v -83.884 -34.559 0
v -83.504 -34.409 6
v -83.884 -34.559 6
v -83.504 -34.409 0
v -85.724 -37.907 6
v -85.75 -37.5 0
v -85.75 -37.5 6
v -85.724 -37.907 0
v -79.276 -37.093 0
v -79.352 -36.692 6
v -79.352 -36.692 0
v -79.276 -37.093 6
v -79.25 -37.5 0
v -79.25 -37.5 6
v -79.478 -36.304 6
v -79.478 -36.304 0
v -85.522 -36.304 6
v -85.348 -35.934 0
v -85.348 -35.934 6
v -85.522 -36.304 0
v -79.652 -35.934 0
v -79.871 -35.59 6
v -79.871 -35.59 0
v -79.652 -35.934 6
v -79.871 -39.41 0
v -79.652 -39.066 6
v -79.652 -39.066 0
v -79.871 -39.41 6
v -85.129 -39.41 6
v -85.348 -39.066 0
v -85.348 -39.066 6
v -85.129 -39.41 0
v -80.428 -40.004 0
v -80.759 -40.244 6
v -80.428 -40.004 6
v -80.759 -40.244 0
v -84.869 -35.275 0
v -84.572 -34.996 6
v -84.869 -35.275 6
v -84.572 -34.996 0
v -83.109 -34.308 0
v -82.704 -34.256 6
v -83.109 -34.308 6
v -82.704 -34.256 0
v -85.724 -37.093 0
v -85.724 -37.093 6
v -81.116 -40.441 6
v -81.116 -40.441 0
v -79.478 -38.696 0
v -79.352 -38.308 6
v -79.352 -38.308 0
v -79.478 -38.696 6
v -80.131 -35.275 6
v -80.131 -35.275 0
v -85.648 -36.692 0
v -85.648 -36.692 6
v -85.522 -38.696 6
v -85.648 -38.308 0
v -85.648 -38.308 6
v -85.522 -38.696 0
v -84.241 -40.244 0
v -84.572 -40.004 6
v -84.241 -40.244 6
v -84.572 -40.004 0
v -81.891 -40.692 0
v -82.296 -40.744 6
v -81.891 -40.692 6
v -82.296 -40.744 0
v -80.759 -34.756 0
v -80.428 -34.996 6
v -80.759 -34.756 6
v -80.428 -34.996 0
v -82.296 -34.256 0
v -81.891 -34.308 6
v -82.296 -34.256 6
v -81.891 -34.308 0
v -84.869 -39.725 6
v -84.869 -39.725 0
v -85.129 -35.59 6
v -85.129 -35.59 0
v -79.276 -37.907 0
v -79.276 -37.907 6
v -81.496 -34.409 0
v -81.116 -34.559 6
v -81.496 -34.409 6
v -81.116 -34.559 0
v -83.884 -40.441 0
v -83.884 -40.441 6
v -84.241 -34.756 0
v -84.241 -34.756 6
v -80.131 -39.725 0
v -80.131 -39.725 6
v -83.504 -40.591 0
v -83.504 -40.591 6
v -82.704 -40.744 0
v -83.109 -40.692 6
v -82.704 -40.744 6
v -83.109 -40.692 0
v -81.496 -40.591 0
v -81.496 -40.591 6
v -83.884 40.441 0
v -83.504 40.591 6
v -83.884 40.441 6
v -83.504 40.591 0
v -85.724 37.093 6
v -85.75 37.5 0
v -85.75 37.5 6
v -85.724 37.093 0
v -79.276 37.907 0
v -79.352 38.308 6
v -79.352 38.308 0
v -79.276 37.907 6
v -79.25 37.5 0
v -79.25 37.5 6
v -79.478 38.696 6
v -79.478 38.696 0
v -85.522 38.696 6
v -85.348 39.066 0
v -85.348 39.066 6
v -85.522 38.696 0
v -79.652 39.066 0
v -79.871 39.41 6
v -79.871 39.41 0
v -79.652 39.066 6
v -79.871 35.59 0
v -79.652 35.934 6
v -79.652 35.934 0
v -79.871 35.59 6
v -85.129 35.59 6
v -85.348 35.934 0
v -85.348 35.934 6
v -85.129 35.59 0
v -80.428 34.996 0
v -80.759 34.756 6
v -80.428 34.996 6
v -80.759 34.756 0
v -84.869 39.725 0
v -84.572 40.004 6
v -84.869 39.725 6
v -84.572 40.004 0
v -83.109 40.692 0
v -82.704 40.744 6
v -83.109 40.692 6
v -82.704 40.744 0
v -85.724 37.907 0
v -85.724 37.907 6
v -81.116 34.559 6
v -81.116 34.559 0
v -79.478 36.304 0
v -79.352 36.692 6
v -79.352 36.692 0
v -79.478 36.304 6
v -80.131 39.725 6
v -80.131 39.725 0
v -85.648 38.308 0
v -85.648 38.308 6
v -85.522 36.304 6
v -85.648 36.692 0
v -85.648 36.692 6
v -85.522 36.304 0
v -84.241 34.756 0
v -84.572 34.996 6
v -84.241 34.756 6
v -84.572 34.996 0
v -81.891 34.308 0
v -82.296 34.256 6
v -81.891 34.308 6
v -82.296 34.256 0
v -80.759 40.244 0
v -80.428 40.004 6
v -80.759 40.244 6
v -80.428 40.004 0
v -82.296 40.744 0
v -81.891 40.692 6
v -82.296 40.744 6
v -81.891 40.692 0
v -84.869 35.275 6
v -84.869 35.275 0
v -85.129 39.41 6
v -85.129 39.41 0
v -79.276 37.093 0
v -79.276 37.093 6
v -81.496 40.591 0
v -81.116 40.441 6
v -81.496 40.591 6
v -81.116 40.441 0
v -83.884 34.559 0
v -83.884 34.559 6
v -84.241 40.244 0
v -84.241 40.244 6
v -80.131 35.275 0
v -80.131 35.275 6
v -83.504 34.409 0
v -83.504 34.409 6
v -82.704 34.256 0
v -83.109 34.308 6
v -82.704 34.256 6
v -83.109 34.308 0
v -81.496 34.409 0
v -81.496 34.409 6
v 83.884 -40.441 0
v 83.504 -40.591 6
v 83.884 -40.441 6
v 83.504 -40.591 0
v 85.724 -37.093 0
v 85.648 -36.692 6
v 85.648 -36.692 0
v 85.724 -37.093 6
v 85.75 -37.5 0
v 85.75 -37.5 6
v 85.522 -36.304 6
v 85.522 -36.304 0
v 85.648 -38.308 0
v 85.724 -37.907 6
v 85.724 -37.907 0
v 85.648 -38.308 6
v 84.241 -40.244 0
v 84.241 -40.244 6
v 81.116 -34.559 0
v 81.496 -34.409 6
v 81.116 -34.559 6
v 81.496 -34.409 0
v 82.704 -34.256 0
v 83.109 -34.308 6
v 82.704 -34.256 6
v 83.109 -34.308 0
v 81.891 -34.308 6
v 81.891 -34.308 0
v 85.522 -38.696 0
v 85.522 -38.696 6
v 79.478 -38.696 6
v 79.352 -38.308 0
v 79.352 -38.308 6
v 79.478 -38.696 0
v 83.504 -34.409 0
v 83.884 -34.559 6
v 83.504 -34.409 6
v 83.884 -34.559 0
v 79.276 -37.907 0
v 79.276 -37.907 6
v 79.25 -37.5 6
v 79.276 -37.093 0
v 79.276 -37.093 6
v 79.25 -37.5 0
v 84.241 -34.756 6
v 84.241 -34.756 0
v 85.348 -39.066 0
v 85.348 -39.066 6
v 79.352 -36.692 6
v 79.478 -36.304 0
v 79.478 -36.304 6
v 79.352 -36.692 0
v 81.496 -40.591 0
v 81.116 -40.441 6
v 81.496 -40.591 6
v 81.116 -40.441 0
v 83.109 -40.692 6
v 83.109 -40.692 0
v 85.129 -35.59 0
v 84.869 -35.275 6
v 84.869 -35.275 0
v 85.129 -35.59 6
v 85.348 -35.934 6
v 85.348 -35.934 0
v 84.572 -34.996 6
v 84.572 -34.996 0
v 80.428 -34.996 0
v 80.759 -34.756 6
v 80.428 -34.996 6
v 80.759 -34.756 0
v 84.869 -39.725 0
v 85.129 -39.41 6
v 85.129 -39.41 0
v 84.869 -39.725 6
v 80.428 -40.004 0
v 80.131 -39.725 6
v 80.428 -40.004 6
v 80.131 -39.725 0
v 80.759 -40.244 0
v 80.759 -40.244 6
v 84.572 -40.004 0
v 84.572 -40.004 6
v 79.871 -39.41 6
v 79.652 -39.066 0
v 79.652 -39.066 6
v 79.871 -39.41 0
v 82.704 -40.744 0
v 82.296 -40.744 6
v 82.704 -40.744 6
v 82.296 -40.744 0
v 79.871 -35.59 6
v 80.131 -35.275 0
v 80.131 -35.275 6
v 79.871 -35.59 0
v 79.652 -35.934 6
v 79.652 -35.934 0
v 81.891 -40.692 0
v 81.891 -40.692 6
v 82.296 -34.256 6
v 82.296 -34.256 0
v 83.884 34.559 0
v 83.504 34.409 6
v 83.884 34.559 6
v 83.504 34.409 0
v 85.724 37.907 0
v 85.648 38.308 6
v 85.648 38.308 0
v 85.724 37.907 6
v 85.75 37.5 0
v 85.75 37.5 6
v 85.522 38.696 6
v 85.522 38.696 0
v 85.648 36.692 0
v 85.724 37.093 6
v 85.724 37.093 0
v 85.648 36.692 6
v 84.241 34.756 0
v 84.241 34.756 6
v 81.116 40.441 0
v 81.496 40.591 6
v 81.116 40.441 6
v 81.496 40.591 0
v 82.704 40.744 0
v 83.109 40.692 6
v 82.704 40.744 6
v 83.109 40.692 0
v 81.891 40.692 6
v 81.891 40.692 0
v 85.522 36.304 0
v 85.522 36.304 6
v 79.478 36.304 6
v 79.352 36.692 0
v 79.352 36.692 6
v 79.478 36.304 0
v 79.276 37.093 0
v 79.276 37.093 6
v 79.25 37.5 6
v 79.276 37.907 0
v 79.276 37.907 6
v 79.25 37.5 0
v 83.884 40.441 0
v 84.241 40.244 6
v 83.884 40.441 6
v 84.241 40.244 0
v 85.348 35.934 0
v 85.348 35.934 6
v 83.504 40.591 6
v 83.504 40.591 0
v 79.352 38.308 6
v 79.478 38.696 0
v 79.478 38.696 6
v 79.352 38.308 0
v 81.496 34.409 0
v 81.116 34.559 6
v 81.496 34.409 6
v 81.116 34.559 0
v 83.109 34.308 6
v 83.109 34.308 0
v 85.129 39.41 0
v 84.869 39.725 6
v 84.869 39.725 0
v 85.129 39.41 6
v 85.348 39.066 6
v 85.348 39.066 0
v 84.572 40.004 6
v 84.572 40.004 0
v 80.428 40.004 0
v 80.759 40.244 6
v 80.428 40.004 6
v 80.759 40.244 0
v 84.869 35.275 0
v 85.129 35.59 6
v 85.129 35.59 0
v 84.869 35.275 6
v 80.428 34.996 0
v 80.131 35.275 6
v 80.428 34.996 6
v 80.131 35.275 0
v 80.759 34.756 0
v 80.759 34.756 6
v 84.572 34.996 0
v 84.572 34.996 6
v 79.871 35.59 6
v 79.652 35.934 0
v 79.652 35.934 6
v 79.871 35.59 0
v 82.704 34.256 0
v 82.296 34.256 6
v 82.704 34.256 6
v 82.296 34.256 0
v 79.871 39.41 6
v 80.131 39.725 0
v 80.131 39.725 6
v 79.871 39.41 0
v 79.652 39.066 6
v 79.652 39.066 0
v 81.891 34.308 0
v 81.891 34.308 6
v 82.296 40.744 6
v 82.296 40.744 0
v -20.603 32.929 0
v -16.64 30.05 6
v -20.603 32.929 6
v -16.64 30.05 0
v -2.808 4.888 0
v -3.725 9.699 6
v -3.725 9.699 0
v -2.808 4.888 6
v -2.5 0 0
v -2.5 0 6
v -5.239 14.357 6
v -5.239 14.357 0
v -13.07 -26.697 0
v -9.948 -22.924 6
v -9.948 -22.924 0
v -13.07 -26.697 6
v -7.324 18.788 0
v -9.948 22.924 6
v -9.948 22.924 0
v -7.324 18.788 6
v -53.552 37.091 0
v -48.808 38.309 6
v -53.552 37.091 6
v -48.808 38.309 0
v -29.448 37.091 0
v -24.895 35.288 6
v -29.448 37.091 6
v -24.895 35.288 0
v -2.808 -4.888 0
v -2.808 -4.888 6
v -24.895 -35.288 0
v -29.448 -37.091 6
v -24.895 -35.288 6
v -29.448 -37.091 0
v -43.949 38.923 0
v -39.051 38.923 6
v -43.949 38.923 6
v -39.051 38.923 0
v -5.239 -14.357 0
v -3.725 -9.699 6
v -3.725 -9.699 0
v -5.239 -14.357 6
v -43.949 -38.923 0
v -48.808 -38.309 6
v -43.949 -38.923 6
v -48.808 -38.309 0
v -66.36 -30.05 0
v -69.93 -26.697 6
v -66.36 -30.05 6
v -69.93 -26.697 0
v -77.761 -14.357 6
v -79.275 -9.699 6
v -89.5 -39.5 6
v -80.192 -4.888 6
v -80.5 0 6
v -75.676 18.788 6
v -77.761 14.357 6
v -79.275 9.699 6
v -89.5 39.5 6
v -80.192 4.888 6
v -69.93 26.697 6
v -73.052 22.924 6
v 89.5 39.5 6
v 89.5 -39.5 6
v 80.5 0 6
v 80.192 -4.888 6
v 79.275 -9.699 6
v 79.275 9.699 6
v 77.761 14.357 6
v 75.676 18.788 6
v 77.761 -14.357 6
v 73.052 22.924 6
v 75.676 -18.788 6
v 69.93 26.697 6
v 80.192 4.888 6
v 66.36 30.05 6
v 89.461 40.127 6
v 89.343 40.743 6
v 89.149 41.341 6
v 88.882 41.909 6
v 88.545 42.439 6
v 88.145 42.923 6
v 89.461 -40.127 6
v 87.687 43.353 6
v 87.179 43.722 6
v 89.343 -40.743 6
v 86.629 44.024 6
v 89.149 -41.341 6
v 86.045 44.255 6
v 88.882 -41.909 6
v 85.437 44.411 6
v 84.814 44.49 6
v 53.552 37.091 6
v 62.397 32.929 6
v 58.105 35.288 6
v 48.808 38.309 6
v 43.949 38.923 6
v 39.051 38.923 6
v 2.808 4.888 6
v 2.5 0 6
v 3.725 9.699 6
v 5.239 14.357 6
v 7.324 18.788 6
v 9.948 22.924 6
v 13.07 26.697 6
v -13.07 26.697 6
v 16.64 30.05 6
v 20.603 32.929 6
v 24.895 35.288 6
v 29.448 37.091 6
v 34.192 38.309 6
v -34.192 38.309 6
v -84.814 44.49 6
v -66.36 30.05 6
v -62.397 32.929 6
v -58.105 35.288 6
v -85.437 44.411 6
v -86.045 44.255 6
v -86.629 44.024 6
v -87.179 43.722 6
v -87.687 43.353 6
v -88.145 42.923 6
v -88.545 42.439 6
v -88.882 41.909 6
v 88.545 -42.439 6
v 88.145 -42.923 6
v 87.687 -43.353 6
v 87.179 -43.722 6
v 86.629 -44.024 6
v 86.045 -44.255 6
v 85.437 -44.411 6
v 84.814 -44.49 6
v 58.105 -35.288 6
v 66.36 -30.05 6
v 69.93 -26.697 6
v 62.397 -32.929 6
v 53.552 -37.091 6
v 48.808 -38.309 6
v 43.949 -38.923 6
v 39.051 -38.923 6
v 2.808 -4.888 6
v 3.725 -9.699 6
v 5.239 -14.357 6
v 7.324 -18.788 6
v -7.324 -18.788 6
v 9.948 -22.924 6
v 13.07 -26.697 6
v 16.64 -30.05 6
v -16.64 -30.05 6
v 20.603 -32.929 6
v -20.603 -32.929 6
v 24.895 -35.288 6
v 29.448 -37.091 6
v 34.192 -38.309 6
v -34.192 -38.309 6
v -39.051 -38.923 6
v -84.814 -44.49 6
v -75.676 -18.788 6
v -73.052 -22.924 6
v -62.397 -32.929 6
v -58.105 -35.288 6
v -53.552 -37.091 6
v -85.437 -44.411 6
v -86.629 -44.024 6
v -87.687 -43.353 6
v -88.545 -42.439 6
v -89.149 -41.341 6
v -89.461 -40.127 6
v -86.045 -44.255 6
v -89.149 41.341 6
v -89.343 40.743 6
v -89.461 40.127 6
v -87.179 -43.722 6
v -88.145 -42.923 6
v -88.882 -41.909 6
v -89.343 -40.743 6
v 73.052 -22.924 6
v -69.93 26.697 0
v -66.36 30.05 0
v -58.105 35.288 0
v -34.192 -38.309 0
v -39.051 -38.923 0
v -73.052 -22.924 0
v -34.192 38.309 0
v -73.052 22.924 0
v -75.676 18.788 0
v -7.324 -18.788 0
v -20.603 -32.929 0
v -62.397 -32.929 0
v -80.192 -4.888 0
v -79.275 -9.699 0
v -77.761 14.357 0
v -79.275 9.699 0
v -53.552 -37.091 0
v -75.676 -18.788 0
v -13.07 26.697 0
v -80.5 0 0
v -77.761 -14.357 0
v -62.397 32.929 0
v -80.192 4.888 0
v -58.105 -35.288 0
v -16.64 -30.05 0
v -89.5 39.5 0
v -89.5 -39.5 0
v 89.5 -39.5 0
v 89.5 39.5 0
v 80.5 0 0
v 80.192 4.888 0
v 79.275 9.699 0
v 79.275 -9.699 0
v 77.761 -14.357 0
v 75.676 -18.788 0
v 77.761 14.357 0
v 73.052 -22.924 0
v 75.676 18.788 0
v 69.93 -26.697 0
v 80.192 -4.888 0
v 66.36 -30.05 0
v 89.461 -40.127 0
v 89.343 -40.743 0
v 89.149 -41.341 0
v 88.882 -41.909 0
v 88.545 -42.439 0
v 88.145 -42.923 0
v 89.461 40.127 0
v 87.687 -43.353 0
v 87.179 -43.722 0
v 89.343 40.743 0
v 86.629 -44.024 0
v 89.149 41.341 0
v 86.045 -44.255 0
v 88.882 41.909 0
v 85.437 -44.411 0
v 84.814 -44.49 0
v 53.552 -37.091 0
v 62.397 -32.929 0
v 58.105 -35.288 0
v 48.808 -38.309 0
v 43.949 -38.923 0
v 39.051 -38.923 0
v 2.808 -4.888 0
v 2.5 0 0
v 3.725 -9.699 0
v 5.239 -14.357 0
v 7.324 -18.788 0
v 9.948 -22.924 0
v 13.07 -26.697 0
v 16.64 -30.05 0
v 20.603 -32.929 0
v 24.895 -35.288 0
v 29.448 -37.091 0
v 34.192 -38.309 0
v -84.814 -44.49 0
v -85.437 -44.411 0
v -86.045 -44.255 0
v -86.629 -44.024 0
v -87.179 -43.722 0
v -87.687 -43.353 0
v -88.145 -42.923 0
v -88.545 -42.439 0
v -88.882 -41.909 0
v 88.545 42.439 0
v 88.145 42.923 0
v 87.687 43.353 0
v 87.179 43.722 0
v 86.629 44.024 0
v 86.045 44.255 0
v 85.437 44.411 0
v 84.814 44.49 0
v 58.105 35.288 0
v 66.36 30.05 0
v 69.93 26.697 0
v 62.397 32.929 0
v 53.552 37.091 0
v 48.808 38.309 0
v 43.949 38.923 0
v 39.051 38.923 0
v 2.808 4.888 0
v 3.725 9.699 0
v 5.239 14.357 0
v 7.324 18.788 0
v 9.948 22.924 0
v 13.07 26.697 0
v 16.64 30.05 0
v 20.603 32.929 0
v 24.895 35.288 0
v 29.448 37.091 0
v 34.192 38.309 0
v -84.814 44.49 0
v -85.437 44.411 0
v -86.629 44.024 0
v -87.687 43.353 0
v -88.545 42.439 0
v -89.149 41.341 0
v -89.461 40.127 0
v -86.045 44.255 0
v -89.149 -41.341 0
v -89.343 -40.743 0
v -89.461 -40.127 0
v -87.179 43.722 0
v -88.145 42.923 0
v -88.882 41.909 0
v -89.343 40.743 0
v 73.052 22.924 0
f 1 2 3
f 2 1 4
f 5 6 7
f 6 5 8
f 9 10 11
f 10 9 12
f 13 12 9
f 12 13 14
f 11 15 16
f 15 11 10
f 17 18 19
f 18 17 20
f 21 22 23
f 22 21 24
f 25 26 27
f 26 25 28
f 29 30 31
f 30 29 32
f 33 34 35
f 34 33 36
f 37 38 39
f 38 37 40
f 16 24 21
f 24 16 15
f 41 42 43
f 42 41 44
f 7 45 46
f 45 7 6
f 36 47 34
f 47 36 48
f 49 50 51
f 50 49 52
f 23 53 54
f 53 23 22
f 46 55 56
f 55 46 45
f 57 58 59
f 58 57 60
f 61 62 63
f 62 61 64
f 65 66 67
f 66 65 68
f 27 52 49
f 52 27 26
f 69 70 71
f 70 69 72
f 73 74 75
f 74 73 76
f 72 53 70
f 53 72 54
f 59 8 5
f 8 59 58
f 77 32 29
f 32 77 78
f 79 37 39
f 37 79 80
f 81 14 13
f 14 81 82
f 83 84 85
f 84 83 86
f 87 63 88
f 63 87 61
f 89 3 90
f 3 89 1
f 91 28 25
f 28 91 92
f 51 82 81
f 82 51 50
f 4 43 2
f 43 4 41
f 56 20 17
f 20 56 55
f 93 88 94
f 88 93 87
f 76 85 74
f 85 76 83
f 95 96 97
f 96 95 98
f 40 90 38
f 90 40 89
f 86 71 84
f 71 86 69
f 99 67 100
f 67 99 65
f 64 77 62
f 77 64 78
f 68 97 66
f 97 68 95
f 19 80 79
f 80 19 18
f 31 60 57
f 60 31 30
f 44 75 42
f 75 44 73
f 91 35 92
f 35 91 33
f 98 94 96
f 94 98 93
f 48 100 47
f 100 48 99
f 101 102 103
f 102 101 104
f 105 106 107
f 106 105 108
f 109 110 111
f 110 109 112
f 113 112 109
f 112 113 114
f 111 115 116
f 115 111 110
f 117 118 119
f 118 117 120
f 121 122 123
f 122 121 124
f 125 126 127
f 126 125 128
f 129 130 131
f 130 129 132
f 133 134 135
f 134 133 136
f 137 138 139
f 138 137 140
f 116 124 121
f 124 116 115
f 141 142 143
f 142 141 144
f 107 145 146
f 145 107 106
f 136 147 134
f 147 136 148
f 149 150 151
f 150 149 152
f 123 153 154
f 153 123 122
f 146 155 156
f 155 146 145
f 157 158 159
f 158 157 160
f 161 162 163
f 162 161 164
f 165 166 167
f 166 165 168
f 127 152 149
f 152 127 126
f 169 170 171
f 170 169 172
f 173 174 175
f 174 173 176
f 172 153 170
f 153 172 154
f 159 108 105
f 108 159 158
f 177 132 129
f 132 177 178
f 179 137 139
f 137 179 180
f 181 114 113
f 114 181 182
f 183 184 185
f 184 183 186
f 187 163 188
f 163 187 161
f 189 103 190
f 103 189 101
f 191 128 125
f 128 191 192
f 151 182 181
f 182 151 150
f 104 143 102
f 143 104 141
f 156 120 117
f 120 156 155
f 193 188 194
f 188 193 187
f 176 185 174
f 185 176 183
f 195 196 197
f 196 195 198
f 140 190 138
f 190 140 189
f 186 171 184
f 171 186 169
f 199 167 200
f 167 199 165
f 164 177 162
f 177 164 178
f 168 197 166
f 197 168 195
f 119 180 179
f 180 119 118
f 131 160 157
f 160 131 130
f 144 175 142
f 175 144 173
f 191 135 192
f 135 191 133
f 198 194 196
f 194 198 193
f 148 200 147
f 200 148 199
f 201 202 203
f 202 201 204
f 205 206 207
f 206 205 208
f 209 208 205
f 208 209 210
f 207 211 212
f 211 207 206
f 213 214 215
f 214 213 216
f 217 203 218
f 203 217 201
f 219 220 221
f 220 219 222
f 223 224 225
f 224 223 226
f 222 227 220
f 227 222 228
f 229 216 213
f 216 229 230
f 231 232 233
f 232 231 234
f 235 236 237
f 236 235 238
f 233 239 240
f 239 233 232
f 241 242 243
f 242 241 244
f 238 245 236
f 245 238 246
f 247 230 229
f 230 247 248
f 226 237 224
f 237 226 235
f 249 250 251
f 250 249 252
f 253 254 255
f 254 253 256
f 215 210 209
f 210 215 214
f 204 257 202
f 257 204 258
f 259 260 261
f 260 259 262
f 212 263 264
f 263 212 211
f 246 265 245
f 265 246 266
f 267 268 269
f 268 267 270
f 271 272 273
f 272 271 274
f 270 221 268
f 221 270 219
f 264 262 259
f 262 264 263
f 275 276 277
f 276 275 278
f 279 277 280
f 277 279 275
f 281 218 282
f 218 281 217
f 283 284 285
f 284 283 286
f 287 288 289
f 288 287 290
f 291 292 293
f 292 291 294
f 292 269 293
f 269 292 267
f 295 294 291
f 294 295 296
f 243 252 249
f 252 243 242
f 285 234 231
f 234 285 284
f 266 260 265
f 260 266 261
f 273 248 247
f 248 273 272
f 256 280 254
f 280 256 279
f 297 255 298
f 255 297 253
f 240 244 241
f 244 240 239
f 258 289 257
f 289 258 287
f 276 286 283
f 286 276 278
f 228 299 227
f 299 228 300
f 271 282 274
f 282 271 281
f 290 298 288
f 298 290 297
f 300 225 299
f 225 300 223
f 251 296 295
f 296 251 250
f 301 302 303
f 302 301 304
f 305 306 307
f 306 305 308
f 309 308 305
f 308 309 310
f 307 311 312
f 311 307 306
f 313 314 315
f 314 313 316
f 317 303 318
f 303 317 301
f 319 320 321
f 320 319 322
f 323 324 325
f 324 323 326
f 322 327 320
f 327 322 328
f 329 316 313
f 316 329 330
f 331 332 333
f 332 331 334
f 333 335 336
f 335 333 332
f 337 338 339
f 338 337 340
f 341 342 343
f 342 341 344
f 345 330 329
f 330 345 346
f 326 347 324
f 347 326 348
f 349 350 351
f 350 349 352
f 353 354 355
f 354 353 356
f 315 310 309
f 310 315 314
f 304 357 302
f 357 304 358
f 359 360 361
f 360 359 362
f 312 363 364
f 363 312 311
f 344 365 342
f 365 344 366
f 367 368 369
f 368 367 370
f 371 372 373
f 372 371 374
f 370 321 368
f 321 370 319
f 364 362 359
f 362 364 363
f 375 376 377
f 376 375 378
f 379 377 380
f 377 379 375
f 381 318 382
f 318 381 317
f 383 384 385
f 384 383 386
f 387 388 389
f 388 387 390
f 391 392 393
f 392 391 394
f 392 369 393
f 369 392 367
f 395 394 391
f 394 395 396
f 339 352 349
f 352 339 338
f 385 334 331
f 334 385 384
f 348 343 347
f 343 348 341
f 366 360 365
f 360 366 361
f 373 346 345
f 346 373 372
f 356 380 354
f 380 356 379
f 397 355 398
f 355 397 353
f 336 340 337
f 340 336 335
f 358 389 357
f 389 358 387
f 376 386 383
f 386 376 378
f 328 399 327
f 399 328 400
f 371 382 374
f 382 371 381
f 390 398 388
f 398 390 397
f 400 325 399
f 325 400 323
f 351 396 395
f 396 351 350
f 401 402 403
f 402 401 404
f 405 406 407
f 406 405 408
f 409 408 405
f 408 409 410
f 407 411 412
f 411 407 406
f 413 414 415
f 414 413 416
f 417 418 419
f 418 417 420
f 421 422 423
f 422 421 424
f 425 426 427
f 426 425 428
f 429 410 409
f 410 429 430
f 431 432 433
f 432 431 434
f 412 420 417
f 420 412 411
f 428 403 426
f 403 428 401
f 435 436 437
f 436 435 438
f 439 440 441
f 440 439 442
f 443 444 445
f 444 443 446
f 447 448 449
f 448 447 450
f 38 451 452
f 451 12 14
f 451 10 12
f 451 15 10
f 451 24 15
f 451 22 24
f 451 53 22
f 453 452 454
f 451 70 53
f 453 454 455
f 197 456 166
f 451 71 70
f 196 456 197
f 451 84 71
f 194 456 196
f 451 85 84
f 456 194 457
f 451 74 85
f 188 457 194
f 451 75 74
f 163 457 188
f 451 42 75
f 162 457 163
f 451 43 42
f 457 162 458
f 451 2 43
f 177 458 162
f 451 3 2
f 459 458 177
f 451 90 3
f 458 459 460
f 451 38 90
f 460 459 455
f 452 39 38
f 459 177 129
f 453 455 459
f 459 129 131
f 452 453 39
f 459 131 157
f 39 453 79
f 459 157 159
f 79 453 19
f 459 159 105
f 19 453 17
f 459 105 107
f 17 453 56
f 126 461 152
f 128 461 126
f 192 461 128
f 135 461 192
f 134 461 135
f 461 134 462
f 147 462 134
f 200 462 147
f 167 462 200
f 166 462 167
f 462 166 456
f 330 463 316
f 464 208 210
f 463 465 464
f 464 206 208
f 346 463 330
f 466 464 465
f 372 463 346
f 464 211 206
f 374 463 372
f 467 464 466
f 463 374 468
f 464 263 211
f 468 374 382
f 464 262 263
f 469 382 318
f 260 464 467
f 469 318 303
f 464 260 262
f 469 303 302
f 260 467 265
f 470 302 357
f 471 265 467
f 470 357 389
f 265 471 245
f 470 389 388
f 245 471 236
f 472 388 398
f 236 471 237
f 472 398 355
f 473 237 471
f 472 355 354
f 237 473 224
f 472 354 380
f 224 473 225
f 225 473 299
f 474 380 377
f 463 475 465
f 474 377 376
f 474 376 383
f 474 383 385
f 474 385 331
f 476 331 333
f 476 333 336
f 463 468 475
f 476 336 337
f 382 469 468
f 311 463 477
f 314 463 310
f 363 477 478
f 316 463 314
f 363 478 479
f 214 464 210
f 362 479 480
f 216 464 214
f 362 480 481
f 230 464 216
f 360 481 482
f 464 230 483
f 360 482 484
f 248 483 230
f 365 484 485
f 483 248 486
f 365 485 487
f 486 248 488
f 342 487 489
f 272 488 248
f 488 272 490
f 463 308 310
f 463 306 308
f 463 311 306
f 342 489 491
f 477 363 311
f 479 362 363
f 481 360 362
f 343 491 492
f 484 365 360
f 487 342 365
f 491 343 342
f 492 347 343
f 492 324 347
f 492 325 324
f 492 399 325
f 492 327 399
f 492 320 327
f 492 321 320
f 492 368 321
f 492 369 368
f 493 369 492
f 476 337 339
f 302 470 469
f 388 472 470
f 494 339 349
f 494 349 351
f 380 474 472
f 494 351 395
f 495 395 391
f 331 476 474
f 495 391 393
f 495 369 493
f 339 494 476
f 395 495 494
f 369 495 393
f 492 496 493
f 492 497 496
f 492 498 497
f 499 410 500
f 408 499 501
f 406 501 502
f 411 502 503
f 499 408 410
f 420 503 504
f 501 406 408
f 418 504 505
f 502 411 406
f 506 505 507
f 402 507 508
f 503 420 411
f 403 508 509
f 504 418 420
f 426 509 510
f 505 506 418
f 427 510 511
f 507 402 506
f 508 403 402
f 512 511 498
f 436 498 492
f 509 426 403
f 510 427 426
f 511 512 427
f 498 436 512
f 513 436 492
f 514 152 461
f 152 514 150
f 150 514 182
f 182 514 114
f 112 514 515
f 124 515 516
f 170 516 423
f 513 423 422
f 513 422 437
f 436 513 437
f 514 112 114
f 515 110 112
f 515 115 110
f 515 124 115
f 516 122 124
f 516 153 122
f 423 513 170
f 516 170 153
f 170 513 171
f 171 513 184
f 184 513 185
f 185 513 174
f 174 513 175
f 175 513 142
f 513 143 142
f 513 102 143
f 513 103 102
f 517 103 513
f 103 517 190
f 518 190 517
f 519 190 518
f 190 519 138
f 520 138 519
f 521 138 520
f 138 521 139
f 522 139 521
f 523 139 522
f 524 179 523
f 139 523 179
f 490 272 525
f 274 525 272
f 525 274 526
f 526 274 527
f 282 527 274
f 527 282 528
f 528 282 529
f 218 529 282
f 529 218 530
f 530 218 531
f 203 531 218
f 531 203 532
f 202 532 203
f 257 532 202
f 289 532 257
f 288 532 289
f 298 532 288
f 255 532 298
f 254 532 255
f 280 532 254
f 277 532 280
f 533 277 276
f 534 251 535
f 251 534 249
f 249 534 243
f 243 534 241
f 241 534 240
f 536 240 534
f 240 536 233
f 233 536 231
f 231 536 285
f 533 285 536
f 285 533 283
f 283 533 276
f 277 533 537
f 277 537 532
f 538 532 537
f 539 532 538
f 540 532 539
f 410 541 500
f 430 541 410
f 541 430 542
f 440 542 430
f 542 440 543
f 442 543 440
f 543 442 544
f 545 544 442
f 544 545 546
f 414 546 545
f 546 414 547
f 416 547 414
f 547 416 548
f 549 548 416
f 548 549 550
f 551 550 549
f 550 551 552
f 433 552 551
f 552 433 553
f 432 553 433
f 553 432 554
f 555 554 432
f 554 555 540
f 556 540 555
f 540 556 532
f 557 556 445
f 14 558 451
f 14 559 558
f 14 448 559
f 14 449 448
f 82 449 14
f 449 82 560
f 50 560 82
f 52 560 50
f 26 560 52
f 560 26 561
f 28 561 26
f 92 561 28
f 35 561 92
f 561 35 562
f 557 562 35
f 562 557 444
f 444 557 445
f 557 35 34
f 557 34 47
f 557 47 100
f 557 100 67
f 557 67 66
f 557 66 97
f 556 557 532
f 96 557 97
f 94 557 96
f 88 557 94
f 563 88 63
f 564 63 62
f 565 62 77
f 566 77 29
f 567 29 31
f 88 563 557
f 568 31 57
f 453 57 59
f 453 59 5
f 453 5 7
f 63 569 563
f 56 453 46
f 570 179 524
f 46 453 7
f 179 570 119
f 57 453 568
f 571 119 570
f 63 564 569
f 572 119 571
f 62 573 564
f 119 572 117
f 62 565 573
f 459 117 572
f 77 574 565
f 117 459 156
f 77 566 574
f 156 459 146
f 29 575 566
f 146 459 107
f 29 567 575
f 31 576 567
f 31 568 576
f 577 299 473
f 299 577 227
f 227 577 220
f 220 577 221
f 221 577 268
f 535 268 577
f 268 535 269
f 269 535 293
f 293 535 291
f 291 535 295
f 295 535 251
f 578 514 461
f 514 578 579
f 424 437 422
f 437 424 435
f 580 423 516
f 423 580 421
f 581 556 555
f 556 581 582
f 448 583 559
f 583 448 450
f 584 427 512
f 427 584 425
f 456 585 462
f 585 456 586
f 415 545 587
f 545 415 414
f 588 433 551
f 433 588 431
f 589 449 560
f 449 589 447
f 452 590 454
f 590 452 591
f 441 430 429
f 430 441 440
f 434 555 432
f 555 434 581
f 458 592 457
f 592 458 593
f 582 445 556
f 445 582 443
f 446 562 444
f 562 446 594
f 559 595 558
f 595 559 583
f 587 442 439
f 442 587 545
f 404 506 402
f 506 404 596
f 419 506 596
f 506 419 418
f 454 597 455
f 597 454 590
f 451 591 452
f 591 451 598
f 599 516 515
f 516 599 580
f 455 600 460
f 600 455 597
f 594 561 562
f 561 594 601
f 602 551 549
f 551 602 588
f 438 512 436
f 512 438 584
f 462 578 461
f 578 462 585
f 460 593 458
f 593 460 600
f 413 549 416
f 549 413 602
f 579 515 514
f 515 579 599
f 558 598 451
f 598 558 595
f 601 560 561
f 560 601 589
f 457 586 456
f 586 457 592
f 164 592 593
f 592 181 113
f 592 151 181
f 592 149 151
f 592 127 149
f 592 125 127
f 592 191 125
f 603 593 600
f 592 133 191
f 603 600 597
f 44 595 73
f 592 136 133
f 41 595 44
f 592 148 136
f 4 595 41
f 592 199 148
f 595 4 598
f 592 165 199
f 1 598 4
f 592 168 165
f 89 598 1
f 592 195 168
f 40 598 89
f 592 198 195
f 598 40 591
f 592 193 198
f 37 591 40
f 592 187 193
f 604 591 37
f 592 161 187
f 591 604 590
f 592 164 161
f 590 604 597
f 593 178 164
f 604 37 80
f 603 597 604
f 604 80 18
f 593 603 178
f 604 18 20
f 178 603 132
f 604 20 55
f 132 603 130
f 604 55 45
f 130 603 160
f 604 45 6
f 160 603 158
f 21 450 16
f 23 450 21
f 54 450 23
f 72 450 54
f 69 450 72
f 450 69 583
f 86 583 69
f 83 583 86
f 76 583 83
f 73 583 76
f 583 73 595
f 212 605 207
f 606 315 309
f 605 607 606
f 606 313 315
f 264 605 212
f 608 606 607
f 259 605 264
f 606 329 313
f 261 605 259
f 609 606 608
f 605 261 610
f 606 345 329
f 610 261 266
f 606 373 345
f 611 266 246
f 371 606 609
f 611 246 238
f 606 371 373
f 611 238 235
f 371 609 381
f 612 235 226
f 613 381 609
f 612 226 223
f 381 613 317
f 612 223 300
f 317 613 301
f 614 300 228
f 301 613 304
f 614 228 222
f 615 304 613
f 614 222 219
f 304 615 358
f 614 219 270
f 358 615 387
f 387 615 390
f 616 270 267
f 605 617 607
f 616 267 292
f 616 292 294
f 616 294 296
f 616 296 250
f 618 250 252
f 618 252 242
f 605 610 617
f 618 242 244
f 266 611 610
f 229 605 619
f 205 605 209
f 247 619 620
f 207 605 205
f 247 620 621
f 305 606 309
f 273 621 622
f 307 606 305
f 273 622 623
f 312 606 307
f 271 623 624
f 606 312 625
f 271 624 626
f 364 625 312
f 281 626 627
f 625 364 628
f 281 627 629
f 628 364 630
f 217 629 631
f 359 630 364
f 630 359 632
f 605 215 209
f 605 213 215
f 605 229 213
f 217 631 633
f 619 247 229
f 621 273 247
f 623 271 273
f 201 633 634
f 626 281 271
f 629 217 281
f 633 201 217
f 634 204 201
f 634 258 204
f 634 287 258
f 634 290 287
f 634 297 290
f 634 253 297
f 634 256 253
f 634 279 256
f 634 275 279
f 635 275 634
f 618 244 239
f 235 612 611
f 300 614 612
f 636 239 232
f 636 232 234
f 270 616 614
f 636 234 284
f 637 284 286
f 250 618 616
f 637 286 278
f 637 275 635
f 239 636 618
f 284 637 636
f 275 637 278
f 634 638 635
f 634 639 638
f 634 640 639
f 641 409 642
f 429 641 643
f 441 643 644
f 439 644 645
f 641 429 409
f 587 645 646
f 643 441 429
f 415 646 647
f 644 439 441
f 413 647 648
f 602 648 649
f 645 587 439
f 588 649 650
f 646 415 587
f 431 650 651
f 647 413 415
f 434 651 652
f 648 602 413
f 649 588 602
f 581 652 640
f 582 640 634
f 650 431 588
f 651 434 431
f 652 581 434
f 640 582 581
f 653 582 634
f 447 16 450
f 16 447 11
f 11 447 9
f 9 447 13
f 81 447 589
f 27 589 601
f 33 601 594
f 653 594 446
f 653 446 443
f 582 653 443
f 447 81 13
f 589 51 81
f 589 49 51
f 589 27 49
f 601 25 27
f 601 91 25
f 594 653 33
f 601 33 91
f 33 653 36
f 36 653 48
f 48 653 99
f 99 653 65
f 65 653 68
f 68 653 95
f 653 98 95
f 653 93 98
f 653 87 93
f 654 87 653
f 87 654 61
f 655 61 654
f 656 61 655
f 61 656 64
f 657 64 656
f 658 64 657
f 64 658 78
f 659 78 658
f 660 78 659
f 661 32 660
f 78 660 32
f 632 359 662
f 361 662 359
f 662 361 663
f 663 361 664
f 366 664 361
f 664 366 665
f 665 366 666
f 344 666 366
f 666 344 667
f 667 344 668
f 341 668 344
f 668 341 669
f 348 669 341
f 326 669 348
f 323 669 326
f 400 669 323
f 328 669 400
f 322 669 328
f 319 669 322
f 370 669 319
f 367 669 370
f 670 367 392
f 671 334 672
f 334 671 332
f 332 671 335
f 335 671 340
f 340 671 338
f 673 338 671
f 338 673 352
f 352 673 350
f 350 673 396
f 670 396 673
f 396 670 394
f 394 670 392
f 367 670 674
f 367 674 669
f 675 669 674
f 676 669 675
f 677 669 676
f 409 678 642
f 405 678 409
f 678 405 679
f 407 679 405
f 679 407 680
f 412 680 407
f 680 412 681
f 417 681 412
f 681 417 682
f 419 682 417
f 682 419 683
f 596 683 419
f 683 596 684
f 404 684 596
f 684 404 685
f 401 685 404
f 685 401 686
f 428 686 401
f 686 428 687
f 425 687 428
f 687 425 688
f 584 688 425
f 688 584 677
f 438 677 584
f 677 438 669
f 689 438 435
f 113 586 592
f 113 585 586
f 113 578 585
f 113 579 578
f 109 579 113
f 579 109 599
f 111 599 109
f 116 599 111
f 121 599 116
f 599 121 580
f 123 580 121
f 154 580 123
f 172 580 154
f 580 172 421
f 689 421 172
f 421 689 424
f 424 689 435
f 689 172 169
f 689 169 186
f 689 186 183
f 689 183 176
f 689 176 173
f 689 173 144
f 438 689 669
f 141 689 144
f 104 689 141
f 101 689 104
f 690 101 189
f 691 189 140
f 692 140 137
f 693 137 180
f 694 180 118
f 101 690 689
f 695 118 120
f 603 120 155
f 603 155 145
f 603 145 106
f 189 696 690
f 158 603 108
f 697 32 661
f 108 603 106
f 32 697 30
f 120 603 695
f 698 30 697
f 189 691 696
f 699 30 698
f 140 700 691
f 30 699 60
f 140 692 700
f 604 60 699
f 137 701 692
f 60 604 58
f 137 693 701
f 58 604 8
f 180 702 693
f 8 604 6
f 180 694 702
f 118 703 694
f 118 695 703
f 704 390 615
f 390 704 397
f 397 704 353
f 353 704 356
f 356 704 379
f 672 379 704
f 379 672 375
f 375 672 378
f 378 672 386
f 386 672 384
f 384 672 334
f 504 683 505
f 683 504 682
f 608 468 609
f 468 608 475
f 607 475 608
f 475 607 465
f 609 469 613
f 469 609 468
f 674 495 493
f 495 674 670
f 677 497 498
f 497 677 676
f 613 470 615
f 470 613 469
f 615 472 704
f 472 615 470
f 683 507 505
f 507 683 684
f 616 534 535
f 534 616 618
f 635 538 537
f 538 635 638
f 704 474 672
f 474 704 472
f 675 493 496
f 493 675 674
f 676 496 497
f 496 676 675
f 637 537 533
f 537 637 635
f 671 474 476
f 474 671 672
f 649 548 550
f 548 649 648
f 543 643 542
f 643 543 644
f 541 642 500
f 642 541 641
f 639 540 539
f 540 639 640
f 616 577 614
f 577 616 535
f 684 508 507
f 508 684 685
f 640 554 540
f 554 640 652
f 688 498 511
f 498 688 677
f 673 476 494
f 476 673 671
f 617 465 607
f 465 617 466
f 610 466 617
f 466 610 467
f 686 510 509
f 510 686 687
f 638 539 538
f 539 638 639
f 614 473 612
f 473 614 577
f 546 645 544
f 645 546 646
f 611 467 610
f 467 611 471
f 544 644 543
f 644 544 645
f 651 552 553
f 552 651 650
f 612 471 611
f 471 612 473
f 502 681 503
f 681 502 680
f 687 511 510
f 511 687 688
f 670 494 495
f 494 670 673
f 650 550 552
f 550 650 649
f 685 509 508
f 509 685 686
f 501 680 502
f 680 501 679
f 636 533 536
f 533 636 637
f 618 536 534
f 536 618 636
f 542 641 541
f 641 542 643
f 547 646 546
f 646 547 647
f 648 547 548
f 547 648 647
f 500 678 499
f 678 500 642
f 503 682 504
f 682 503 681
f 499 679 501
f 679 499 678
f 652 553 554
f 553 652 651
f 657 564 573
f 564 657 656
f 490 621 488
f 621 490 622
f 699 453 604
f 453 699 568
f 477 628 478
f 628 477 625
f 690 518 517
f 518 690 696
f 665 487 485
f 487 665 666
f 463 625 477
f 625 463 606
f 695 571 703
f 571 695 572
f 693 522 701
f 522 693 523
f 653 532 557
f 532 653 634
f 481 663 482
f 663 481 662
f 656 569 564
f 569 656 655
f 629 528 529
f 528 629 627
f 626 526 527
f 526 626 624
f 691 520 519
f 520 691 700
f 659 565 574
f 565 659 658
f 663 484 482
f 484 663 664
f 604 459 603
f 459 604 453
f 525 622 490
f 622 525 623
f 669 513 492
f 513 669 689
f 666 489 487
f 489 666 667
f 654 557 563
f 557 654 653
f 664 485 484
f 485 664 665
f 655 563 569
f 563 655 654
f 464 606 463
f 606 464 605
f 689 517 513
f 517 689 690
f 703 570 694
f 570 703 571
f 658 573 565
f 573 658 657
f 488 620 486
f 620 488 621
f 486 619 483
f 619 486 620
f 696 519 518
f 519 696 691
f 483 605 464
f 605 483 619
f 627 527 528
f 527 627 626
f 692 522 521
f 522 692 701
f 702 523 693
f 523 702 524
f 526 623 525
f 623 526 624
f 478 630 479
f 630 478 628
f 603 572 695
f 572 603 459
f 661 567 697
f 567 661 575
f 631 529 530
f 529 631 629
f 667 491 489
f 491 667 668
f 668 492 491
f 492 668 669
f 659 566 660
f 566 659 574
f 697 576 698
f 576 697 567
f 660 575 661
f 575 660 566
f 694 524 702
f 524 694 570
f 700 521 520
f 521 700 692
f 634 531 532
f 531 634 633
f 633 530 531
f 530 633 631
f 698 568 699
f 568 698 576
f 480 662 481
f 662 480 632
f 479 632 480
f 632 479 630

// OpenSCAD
$fn = 50;


difference() {
	union() {
		hull() {
			translate(v = [-84.5000000000, 39.5000000000, 0]) {
				cylinder(h = 6, r = 5);
			}
			translate(v = [84.5000000000, 39.5000000000, 0]) {
				cylinder(h = 6, r = 5);
			}
			translate(v = [-84.5000000000, -39.5000000000, 0]) {
				cylinder(h = 6, r = 5);
			}
			translate(v = [84.5000000000, -39.5000000000, 0]) {
				cylinder(h = 6, r = 5);
			}
		}
	}
	union() {
		#translate(v = [-82.5000000000, -37.5000000000, -100.0000000000]) {
			cylinder(h = 200, r = 3.2500000000);
		}
		#translate(v = [-82.5000000000, 37.5000000000, -100.0000000000]) {
			cylinder(h = 200, r = 3.2500000000);
		}
		#translate(v = [82.5000000000, -37.5000000000, -100.0000000000]) {
			cylinder(h = 200, r = 3.2500000000);
		}
		#translate(v = [82.5000000000, 37.5000000000, -100.0000000000]) {
			cylinder(h = 200, r = 3.2500000000);
		}
		#translate(v = [-41.5000000000, 0, 0]) {
			cylinder(h = 6, r = 39.0000000000);
		}
		#translate(v = [41.5000000000, 0, 0]) {
			cylinder(h = 6, r = 39.0000000000);
		}
	}
}
